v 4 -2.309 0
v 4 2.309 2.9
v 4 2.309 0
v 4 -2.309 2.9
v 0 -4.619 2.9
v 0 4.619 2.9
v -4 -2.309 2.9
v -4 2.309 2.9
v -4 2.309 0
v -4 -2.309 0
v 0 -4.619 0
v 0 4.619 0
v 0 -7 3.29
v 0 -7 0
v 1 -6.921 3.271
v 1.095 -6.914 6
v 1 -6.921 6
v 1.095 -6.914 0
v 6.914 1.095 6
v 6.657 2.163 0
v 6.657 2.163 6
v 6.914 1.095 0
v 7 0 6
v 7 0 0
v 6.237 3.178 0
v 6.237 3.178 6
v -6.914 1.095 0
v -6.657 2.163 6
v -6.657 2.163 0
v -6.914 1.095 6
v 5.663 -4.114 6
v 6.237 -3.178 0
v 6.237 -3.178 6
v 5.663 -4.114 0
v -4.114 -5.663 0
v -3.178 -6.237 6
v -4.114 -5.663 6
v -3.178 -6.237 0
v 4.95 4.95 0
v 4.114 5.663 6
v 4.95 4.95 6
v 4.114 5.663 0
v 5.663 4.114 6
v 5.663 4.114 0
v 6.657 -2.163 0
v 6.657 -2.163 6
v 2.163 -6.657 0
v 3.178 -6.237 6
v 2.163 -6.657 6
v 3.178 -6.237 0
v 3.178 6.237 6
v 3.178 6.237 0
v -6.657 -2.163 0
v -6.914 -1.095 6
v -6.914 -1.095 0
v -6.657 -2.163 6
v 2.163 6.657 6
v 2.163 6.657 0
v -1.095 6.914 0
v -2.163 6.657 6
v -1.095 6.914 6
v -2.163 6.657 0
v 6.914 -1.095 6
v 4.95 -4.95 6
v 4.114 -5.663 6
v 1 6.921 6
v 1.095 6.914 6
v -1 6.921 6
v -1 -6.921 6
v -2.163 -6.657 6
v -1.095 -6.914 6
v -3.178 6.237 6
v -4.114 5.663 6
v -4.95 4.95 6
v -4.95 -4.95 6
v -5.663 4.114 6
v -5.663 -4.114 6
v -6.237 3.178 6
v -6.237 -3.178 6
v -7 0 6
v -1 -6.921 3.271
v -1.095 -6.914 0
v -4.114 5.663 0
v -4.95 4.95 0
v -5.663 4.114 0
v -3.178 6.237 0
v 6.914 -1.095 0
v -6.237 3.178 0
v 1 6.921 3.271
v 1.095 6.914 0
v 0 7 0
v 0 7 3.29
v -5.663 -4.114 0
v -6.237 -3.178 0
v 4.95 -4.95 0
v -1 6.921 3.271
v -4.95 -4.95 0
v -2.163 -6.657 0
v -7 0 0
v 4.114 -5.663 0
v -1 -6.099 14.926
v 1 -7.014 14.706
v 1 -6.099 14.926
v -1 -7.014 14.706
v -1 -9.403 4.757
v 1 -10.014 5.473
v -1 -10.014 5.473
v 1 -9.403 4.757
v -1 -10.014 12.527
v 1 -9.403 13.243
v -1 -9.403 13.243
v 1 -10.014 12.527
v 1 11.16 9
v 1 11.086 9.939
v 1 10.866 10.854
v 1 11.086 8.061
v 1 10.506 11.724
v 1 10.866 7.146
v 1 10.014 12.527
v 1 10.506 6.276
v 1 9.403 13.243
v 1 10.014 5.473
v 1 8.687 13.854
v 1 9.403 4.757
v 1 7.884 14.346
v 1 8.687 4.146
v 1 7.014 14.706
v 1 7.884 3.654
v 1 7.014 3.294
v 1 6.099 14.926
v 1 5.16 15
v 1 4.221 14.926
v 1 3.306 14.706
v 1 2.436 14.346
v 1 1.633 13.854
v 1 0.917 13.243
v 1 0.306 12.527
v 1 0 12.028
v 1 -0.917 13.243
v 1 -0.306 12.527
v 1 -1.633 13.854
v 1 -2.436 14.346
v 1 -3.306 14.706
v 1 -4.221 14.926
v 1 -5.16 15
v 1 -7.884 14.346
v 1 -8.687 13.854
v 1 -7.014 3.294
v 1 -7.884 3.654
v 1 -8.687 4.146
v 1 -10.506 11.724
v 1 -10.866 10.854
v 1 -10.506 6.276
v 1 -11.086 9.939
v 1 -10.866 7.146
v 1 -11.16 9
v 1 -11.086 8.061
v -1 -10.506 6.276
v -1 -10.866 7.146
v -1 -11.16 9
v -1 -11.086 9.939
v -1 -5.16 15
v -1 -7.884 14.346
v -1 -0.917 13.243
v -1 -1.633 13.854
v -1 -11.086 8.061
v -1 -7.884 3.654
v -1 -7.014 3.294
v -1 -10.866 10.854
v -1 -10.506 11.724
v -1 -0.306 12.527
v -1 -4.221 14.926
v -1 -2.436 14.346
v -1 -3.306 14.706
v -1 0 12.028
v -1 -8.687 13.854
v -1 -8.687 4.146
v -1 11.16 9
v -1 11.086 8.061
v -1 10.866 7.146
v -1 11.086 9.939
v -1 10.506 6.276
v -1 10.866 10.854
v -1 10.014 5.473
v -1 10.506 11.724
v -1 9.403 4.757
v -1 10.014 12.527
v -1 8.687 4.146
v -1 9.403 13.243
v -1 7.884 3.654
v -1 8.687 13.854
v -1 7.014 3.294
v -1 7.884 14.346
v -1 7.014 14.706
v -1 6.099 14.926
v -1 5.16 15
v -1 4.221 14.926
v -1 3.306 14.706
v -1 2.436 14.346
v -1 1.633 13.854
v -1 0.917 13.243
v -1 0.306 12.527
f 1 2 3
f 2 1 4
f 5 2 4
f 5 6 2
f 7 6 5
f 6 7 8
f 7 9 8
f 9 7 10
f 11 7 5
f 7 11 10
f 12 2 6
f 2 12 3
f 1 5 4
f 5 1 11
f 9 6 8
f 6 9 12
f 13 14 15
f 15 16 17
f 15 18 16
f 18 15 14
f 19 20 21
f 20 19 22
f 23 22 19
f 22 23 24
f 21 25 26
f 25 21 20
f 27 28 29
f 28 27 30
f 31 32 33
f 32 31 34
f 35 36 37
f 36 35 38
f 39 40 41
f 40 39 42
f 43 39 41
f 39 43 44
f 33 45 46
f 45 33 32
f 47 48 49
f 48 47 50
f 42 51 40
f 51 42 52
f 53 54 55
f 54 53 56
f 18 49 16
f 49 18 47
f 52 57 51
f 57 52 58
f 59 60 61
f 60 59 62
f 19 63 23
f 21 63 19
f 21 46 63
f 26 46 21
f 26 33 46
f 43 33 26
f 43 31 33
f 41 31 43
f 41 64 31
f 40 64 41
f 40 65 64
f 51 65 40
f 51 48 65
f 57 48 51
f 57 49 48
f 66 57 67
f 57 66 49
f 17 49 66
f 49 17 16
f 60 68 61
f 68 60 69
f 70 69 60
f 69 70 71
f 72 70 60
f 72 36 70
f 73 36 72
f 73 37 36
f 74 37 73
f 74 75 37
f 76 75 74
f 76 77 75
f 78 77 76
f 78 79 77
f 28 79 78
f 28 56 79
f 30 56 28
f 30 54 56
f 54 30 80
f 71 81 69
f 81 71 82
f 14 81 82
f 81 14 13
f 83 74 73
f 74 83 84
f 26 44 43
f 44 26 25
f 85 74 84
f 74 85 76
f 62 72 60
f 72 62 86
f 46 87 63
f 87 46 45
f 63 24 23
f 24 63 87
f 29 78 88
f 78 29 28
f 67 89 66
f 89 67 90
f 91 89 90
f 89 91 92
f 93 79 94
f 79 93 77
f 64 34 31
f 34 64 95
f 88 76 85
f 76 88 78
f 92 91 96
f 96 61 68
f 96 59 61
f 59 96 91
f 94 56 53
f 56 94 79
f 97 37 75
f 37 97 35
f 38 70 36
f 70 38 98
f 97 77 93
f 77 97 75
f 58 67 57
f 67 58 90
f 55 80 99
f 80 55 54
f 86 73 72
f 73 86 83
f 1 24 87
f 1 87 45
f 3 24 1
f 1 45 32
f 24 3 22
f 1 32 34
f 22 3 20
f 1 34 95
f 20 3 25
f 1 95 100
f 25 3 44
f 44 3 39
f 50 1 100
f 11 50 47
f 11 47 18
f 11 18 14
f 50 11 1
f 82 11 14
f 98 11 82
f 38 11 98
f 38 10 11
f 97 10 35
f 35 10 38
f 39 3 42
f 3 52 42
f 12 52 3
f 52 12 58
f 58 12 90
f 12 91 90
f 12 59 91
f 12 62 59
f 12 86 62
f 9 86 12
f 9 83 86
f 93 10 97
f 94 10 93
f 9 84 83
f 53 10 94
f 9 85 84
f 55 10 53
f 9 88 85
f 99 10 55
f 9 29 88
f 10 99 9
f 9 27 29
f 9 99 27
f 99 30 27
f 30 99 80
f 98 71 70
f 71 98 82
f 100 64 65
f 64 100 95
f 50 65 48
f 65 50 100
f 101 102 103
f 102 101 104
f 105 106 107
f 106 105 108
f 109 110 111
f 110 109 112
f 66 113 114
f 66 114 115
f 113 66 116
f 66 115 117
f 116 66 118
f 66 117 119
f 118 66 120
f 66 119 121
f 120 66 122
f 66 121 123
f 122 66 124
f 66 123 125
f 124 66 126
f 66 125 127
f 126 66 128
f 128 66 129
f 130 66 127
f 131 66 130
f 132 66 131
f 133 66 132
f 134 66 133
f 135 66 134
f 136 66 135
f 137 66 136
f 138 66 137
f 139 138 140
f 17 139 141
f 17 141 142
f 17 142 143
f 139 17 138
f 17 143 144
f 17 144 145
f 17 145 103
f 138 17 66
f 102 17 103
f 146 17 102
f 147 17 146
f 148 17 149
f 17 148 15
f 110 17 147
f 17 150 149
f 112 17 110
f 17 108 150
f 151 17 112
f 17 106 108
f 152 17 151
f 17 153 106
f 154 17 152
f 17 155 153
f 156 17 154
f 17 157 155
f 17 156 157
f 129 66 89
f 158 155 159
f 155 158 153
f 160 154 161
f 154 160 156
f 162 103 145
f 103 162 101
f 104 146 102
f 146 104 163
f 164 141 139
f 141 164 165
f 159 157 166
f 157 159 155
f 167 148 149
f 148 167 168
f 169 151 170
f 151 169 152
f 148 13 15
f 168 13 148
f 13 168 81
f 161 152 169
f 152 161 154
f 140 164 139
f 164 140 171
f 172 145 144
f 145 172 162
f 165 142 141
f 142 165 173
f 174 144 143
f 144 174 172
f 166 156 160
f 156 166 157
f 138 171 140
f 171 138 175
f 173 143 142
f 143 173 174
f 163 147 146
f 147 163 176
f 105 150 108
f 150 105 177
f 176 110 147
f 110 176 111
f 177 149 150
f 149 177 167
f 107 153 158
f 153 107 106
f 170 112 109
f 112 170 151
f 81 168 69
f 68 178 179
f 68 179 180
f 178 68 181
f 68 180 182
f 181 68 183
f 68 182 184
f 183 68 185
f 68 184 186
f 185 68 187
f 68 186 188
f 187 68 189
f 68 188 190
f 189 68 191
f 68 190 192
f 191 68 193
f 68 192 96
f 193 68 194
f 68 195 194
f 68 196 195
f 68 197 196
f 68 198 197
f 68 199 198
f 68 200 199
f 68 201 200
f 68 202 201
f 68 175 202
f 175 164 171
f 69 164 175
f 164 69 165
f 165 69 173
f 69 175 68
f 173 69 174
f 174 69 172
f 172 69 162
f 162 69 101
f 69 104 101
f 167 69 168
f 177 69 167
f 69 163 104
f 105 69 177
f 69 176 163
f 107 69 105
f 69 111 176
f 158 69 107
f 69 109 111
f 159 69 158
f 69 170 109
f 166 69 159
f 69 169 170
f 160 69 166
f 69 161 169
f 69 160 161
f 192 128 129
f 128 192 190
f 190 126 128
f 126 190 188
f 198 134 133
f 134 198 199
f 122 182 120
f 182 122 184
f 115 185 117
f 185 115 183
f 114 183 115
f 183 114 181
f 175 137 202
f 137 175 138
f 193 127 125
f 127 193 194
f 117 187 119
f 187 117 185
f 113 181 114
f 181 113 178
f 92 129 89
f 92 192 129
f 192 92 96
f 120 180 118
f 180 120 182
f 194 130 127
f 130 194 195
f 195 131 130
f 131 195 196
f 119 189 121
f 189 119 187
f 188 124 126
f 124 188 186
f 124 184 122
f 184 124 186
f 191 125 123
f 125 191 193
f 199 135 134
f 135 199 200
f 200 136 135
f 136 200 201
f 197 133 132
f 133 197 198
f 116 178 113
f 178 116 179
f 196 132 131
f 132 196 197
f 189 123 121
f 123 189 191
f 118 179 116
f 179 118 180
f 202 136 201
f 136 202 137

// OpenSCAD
/*
Finger-Friendly Snap-On Hex Socket (a.k.a. Bolt Ears)
Copyright (C) 2015 Marcio Teixeira

This program is free software; you can redistribute it and/or
modify it under the terms of the GNU General Public License
as published by the Free Software Foundation; either version 2
of the License, or (at your option) any later version.

This program is distributed in the hope that it will be useful,
but WITHOUT ANY WARRANTY; without even the implied warranty of
MERCHANTABILITY or FITNESS FOR A PARTICULAR PURPOSE.  See the
GNU General Public License for more details.

You should have received a copy of the GNU General Public License
along with this program; if not, write to the Free Software
Foundation, Inc., 51 Franklin Street, Fifth Floor, Boston, MA  02110-1301, USA.
*/

/* Combination hex socket and finger friendly Mickey ears, great
 * for easy removal of access panels (I used to curse my central AC
 * whenever it came time to change the filter. Not anymore!)
 */

/* [Hex Socket] */

// Measurement from flat face to opposite face on the bolt head, make it snug so it stays on firmly
head_dimension  = 8;

// Just a bit deeper than the depth of the bolt head
socket_depth    = 3.0;

/* [Customize] */
wall_thickness = 3.0;
ear_diameter   = head_dimension*1.5;
ear_thickness  = 2.0;
ear_spacing    = 0.43;     // [0:0.05:0.75]
ear_style      = "mickey"; // [mickey, pill, retro]

/* [Hidden] */

$fn=40;

module hull_or_not(hull) {
    if(hull == true) {
        hull() children();
    } else {
        children();
    }
}

module symmetry(axis) {
    mirror(axis) {
        children();
    }
    children();
}

/* Constructs a hexagon */
module hexagon(d, h,sides=6) {
    w  = (d/2)*tan(360/(sides*2))*2;
    translate([0,0,h/2])
        for( a = [0:360/sides:360] ) {
            rotate([0,0,a])
                cube([d,w,h],center=true);
        }
}

/* Constructs a hex socket */
module hex_socket(d, h, wall_thickness, sides=6) {
    difference() {
        cylinder(d=d+wall_thickness*2,h=h+wall_thickness);
        translate([0,0,-0.1])
            hexagon(d,h);
    }
}

/* Combination hex socket and finger friendly Mickey ears */
module finger_wrench() {
    hex_socket(head_dimension, socket_depth, wall_thickness);

    cylinder_width = head_dimension+wall_thickness*2;
    
    // Give it ears
    if(ear_style == "retro") {
        // Fancy tapered style
        hull() {
            symmetry([0,1,0])
            translate([0,ear_diameter*(ear_spacing+1)/2, socket_depth + ear_diameter*3/4])
                rotate([0,90,0])
                    hull() {
                        cylinder(r=ear_diameter/4, center=true, h=ear_thickness);
                        translate([ear_diameter/4,0,0])
                            cylinder(r=ear_diameter/4, center=true, h=ear_thickness);
                    }
            
            translate([0,0, socket_depth + wall_thickness/2])
                cube(size=[ear_thickness*1.5,cylinder_width,ear_thickness], center=true);
        }
    } else {
        // Pill and mickey styles differ only by whether they are hulled
        hull_or_not(ear_style != "mickey")
        symmetry([0,1,0])
        translate([0,ear_diameter*ear_spacing,ear_diameter/2+socket_depth])
        rotate([0,90,0])
            cylinder(d=ear_diameter,h=ear_thickness, center=true);
    }
}

finger_wrench();
